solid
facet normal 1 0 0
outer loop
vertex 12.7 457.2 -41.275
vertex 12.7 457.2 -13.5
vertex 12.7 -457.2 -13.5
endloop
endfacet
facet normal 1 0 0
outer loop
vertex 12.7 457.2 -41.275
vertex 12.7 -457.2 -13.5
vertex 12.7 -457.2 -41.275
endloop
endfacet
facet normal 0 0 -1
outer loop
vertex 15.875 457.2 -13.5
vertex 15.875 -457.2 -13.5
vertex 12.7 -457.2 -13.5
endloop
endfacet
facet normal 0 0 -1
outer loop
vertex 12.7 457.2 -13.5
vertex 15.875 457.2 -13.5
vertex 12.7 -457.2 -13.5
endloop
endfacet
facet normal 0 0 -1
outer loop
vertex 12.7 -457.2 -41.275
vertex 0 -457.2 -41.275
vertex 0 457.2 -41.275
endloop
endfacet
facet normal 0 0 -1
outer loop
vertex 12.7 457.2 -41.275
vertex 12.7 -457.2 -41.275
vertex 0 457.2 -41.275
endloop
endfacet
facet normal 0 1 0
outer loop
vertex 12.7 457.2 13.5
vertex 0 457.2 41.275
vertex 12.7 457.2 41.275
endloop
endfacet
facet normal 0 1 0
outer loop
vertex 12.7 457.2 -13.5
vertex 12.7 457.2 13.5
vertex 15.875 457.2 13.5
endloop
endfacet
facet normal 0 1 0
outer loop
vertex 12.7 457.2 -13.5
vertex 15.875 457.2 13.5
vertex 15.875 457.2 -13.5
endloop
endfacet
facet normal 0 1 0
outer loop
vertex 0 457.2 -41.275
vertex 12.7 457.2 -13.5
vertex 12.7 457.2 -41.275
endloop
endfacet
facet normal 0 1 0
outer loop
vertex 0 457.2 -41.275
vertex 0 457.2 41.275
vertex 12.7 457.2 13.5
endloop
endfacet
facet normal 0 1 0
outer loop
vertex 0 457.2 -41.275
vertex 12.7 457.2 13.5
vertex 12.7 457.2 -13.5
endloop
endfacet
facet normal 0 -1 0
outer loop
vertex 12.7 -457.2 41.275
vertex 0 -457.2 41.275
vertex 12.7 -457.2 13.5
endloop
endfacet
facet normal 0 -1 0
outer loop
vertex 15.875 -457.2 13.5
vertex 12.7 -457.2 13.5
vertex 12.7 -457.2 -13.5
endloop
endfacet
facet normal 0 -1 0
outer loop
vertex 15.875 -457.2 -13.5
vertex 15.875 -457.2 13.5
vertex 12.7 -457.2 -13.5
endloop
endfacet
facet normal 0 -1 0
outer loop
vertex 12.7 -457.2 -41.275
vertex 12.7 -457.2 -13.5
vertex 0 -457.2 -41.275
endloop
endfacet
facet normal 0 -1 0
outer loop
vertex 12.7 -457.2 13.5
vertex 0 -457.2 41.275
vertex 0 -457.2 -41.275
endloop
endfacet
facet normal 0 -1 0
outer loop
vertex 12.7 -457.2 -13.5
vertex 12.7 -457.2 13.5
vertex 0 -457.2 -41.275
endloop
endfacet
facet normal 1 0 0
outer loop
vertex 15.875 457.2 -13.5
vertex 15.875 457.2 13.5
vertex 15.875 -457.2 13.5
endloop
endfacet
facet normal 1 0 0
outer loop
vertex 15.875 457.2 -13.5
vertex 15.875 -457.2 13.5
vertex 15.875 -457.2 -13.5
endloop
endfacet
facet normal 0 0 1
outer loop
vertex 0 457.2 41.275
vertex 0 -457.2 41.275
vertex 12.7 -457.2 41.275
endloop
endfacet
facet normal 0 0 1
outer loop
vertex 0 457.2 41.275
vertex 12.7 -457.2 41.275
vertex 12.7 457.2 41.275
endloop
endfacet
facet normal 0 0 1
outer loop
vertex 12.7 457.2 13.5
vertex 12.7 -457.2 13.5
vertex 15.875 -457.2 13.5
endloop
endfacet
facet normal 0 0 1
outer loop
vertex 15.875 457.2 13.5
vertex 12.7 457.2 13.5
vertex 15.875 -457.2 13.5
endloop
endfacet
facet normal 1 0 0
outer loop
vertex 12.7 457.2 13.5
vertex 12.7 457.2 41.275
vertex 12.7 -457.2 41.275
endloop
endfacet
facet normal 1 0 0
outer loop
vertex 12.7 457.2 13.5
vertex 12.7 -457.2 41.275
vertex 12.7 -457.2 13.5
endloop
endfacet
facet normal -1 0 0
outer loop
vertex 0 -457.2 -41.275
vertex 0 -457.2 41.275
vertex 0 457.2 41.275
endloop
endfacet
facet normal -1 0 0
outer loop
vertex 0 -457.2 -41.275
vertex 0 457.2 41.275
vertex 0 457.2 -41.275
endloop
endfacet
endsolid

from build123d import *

# Parameters (mm, degrees)
ESQUISSE1_W             = 82.55
ESQUISSE1_H             = 914.4
BOSS_EXTRU_1_DEPTH      = 15.875
ENL_V_MAT_EXTRU_1_DEPTH = 916.468733082


with BuildPart() as part:
    # Esquisse1 → Boss.-Extru.1 (new body)
    with BuildSketch(Plane(origin=(0, 0, 0), x_dir=(0, 0, -1), z_dir=(1, 0, 0))):
        Rectangle(ESQUISSE1_W, ESQUISSE1_H)
    extrude(amount=BOSS_EXTRU_1_DEPTH)

    # Esquisse3 → Enlèv. mat.-Extru.1 (cut, through all)
    with BuildSketch(Plane(origin=(0, 457.2, 0), x_dir=(1, 0, 0), z_dir=(0, 1, 0))):
        Polygon((12.7, 41.275), (38.1, 41.275), (38.1, -41.275), (12.7, -41.275), (12.7, -13.5), (19.05, -13.5), (19.05, 13.5), (12.7, 13.5), align=None)
    extrude(amount=-ENL_V_MAT_EXTRU_1_DEPTH, mode=Mode.SUBTRACT)


solid = part.part
